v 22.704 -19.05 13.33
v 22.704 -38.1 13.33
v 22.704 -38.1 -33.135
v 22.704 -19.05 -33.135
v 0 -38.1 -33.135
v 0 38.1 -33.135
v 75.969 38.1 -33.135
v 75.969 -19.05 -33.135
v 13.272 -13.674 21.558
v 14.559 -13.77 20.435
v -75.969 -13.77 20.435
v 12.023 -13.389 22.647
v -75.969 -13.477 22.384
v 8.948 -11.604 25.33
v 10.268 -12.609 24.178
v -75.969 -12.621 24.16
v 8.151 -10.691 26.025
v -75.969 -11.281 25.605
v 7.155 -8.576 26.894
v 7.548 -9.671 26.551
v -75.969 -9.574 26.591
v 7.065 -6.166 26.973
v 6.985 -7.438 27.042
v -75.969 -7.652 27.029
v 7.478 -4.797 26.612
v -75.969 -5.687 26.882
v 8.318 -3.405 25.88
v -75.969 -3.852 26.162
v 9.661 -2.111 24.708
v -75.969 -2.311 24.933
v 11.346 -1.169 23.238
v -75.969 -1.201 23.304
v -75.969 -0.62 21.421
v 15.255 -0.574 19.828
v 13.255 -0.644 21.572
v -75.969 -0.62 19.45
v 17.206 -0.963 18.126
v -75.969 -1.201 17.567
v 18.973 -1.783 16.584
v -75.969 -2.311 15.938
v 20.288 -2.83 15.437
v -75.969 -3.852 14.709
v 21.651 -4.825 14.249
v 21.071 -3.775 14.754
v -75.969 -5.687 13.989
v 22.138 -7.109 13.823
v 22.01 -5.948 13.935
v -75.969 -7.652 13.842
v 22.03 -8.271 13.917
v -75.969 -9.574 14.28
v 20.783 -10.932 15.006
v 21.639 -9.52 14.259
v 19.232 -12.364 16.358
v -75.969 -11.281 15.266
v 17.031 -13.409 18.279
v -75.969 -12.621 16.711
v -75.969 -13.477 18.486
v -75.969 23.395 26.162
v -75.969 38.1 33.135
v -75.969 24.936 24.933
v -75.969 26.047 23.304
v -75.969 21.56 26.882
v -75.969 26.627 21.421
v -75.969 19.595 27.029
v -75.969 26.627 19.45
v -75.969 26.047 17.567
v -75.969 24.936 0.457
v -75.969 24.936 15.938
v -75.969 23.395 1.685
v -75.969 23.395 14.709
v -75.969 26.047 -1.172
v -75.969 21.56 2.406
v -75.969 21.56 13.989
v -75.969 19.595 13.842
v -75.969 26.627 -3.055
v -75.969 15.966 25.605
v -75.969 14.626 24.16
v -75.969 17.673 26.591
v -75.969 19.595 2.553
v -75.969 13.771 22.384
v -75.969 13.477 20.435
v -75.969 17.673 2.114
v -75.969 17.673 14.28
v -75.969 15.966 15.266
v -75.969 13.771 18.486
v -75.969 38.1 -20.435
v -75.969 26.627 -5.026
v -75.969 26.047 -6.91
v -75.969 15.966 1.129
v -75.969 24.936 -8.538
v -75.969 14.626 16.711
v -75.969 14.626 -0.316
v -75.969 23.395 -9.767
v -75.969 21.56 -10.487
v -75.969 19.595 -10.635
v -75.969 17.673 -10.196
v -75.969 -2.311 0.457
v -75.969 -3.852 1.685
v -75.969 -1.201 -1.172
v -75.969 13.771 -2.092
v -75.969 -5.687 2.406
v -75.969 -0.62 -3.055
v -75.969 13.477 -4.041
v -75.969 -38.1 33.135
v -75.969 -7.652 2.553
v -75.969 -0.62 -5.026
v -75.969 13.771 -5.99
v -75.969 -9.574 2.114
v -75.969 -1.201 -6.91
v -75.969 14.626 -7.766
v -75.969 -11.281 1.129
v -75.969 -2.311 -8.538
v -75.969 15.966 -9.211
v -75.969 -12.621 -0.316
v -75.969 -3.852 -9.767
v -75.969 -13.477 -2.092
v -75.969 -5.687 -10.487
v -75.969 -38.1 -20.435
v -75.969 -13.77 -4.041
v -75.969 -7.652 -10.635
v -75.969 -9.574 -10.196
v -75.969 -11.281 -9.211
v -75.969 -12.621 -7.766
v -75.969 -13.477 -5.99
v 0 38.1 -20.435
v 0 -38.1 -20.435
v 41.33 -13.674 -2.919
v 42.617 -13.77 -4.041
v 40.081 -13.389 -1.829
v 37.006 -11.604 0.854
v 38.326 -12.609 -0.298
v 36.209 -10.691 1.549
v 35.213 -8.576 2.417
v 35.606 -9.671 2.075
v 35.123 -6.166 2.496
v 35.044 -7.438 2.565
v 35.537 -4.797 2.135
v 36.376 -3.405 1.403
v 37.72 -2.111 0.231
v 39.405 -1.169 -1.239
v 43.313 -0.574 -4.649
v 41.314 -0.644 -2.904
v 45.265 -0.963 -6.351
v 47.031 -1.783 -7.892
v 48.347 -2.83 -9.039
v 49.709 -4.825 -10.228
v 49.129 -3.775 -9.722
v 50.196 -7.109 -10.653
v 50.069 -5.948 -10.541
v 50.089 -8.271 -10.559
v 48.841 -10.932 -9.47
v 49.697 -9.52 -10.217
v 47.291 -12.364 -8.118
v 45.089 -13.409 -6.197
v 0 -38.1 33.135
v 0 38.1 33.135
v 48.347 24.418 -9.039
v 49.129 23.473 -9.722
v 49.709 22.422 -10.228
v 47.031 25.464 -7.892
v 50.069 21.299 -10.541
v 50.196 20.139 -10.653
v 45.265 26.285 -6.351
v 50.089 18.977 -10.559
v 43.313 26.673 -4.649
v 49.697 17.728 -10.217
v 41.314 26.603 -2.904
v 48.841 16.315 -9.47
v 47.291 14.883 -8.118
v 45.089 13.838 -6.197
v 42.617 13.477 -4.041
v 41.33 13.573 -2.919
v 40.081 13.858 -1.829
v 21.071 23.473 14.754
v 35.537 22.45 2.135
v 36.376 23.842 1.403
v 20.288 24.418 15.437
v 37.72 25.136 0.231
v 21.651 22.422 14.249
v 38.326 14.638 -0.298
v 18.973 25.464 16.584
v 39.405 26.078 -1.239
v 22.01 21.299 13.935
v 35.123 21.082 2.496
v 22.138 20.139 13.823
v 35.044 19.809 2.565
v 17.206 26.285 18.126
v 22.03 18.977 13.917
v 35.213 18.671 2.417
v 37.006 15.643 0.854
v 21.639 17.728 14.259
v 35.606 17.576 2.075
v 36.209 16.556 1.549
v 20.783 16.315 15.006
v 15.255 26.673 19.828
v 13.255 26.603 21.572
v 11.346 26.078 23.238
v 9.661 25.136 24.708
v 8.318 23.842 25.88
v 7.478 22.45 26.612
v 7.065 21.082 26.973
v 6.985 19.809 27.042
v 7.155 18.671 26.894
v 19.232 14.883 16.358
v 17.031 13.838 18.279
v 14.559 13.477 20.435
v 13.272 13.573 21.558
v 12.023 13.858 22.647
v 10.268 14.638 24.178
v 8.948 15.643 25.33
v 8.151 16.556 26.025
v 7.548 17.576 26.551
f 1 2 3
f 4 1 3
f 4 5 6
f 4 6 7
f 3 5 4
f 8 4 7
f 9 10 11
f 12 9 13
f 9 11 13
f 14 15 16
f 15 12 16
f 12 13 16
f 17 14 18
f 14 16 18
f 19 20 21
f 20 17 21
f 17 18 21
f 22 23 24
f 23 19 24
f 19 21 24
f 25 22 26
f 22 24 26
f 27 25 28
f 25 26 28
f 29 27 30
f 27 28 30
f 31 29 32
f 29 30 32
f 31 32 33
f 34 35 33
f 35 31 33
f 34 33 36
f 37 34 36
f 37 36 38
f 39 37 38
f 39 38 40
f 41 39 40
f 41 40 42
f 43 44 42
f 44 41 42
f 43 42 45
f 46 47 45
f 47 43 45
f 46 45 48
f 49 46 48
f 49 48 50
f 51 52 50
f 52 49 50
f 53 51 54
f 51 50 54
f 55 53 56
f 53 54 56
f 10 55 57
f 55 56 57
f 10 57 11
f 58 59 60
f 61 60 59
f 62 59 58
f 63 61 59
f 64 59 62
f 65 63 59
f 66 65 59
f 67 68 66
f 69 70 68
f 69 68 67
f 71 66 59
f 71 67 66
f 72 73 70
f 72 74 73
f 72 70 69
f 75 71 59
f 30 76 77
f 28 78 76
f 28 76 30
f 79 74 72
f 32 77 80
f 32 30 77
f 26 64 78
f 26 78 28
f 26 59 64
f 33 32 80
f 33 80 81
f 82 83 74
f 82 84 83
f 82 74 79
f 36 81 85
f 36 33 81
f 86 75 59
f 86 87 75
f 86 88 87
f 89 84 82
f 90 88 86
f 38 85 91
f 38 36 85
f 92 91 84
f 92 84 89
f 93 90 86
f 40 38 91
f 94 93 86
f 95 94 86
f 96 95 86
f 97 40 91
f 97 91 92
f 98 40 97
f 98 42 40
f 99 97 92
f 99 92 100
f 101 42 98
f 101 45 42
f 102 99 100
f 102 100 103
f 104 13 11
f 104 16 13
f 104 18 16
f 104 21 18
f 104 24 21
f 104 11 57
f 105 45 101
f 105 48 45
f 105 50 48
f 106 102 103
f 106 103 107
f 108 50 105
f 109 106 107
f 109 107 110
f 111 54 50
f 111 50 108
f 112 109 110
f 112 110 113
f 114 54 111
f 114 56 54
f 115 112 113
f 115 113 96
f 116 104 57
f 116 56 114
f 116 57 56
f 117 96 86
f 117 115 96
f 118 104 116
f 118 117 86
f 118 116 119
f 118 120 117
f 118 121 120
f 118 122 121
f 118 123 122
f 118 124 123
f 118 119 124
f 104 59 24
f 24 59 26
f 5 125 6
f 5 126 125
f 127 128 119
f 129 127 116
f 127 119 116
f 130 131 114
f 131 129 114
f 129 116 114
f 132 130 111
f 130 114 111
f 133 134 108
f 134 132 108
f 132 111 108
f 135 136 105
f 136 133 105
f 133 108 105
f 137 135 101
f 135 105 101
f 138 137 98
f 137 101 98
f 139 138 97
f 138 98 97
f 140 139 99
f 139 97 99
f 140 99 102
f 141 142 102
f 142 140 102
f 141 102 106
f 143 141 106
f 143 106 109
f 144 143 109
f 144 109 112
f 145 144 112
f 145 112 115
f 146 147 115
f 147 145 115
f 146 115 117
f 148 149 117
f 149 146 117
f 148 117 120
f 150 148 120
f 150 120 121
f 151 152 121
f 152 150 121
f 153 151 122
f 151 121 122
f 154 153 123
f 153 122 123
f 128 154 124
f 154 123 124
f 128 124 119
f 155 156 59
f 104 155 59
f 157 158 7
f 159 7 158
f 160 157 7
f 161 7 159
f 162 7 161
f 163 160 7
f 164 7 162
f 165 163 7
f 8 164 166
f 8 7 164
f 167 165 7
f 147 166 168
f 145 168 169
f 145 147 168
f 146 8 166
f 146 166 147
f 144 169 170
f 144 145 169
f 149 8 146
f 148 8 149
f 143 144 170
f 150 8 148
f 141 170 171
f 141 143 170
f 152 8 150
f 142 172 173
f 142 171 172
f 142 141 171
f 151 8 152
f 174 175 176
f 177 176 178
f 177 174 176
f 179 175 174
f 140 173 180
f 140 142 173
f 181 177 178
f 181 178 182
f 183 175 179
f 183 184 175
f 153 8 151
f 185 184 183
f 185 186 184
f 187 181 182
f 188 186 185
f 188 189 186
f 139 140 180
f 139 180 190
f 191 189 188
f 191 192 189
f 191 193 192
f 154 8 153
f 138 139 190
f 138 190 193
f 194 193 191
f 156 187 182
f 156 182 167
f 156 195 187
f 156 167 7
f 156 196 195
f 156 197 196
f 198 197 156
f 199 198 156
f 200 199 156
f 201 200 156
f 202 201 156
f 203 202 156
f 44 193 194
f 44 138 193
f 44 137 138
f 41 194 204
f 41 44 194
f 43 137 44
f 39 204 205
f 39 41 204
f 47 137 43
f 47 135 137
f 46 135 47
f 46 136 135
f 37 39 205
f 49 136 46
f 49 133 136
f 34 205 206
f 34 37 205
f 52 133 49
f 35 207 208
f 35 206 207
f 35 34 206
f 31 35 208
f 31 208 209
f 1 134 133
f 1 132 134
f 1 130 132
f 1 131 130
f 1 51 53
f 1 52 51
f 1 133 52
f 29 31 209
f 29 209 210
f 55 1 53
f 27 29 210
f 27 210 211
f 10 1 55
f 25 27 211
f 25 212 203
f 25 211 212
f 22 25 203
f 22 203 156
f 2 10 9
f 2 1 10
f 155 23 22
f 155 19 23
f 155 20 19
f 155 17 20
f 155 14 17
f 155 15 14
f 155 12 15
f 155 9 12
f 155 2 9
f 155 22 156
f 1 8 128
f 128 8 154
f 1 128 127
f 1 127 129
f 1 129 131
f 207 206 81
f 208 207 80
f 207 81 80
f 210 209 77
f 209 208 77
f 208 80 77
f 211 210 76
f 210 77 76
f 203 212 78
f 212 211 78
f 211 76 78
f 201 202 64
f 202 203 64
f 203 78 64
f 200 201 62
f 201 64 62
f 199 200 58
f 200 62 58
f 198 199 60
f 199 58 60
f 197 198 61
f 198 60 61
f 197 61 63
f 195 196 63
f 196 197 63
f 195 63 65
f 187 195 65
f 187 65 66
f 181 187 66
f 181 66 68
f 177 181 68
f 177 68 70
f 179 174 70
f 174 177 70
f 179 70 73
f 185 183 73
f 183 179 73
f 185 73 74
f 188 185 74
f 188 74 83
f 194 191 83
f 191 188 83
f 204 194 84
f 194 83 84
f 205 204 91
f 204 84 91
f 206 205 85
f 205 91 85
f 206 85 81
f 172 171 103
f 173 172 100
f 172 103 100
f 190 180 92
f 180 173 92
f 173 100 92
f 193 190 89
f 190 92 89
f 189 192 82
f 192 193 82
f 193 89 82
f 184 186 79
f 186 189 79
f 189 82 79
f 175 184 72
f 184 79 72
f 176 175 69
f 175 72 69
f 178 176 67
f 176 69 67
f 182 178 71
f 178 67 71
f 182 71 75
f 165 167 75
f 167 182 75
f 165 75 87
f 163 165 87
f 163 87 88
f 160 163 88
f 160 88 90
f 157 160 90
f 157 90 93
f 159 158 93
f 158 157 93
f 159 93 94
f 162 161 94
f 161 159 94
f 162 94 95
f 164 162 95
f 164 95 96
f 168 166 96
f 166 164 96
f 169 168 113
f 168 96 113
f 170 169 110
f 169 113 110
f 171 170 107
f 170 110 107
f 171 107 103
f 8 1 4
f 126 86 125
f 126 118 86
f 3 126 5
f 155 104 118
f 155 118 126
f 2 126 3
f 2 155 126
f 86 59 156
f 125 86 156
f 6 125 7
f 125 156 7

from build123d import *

# Parameters (mm, degrees)
F1_DEPTH = 38.1
F3_DEPTH = 19.05
F4_R     = 6.6122304169
F5_DEPTH = 254


with BuildPart() as f1:
    # F0 (on Front) → F1 (new body, symmetric)
    with BuildSketch(Plane.XZ):
        Polygon((0, -33.1354551017), (75.9690925479, -33.1354551017), (0, 33.1354551017), (-75.9690925479, 33.1354551017), (-75.9690925479, -20.4354561865), (0, -20.4354561865), align=None)
    extrude(amount=F1_DEPTH, both=True)

    # F2 (on face) → F3 (cut)
    with BuildSketch(Plane.XZ.offset(38.1)):
        Polygon((22.7042404154, -33.1354551017), (75.9690925479, -33.1354551017), (22.7042404154, 13.3296284511), align=None)
    extrude(amount=-F3_DEPTH, mode=Mode.SUBTRACT)

    # F4 (on face) → F5 (cut)
    with BuildSketch(Plane(origin=(-75.9690925479, 0, 0), x_dir=(0, -1, 0), z_dir=(-1, 0, 0))):
        with Locations((7.1581806988, 20.4354561865)):
            Circle(F4_R)
        with Locations((-20.0890917331, -4.0409089997)):
            Circle(F4_R)
        with Locations((7.1581806988, -4.0409089997)):
            Circle(F4_R)
        with Locations((-20.0890917331, 20.4354561865)):
            Circle(F4_R)
    extrude(amount=-F5_DEPTH, mode=Mode.SUBTRACT)


solid = f1.part
